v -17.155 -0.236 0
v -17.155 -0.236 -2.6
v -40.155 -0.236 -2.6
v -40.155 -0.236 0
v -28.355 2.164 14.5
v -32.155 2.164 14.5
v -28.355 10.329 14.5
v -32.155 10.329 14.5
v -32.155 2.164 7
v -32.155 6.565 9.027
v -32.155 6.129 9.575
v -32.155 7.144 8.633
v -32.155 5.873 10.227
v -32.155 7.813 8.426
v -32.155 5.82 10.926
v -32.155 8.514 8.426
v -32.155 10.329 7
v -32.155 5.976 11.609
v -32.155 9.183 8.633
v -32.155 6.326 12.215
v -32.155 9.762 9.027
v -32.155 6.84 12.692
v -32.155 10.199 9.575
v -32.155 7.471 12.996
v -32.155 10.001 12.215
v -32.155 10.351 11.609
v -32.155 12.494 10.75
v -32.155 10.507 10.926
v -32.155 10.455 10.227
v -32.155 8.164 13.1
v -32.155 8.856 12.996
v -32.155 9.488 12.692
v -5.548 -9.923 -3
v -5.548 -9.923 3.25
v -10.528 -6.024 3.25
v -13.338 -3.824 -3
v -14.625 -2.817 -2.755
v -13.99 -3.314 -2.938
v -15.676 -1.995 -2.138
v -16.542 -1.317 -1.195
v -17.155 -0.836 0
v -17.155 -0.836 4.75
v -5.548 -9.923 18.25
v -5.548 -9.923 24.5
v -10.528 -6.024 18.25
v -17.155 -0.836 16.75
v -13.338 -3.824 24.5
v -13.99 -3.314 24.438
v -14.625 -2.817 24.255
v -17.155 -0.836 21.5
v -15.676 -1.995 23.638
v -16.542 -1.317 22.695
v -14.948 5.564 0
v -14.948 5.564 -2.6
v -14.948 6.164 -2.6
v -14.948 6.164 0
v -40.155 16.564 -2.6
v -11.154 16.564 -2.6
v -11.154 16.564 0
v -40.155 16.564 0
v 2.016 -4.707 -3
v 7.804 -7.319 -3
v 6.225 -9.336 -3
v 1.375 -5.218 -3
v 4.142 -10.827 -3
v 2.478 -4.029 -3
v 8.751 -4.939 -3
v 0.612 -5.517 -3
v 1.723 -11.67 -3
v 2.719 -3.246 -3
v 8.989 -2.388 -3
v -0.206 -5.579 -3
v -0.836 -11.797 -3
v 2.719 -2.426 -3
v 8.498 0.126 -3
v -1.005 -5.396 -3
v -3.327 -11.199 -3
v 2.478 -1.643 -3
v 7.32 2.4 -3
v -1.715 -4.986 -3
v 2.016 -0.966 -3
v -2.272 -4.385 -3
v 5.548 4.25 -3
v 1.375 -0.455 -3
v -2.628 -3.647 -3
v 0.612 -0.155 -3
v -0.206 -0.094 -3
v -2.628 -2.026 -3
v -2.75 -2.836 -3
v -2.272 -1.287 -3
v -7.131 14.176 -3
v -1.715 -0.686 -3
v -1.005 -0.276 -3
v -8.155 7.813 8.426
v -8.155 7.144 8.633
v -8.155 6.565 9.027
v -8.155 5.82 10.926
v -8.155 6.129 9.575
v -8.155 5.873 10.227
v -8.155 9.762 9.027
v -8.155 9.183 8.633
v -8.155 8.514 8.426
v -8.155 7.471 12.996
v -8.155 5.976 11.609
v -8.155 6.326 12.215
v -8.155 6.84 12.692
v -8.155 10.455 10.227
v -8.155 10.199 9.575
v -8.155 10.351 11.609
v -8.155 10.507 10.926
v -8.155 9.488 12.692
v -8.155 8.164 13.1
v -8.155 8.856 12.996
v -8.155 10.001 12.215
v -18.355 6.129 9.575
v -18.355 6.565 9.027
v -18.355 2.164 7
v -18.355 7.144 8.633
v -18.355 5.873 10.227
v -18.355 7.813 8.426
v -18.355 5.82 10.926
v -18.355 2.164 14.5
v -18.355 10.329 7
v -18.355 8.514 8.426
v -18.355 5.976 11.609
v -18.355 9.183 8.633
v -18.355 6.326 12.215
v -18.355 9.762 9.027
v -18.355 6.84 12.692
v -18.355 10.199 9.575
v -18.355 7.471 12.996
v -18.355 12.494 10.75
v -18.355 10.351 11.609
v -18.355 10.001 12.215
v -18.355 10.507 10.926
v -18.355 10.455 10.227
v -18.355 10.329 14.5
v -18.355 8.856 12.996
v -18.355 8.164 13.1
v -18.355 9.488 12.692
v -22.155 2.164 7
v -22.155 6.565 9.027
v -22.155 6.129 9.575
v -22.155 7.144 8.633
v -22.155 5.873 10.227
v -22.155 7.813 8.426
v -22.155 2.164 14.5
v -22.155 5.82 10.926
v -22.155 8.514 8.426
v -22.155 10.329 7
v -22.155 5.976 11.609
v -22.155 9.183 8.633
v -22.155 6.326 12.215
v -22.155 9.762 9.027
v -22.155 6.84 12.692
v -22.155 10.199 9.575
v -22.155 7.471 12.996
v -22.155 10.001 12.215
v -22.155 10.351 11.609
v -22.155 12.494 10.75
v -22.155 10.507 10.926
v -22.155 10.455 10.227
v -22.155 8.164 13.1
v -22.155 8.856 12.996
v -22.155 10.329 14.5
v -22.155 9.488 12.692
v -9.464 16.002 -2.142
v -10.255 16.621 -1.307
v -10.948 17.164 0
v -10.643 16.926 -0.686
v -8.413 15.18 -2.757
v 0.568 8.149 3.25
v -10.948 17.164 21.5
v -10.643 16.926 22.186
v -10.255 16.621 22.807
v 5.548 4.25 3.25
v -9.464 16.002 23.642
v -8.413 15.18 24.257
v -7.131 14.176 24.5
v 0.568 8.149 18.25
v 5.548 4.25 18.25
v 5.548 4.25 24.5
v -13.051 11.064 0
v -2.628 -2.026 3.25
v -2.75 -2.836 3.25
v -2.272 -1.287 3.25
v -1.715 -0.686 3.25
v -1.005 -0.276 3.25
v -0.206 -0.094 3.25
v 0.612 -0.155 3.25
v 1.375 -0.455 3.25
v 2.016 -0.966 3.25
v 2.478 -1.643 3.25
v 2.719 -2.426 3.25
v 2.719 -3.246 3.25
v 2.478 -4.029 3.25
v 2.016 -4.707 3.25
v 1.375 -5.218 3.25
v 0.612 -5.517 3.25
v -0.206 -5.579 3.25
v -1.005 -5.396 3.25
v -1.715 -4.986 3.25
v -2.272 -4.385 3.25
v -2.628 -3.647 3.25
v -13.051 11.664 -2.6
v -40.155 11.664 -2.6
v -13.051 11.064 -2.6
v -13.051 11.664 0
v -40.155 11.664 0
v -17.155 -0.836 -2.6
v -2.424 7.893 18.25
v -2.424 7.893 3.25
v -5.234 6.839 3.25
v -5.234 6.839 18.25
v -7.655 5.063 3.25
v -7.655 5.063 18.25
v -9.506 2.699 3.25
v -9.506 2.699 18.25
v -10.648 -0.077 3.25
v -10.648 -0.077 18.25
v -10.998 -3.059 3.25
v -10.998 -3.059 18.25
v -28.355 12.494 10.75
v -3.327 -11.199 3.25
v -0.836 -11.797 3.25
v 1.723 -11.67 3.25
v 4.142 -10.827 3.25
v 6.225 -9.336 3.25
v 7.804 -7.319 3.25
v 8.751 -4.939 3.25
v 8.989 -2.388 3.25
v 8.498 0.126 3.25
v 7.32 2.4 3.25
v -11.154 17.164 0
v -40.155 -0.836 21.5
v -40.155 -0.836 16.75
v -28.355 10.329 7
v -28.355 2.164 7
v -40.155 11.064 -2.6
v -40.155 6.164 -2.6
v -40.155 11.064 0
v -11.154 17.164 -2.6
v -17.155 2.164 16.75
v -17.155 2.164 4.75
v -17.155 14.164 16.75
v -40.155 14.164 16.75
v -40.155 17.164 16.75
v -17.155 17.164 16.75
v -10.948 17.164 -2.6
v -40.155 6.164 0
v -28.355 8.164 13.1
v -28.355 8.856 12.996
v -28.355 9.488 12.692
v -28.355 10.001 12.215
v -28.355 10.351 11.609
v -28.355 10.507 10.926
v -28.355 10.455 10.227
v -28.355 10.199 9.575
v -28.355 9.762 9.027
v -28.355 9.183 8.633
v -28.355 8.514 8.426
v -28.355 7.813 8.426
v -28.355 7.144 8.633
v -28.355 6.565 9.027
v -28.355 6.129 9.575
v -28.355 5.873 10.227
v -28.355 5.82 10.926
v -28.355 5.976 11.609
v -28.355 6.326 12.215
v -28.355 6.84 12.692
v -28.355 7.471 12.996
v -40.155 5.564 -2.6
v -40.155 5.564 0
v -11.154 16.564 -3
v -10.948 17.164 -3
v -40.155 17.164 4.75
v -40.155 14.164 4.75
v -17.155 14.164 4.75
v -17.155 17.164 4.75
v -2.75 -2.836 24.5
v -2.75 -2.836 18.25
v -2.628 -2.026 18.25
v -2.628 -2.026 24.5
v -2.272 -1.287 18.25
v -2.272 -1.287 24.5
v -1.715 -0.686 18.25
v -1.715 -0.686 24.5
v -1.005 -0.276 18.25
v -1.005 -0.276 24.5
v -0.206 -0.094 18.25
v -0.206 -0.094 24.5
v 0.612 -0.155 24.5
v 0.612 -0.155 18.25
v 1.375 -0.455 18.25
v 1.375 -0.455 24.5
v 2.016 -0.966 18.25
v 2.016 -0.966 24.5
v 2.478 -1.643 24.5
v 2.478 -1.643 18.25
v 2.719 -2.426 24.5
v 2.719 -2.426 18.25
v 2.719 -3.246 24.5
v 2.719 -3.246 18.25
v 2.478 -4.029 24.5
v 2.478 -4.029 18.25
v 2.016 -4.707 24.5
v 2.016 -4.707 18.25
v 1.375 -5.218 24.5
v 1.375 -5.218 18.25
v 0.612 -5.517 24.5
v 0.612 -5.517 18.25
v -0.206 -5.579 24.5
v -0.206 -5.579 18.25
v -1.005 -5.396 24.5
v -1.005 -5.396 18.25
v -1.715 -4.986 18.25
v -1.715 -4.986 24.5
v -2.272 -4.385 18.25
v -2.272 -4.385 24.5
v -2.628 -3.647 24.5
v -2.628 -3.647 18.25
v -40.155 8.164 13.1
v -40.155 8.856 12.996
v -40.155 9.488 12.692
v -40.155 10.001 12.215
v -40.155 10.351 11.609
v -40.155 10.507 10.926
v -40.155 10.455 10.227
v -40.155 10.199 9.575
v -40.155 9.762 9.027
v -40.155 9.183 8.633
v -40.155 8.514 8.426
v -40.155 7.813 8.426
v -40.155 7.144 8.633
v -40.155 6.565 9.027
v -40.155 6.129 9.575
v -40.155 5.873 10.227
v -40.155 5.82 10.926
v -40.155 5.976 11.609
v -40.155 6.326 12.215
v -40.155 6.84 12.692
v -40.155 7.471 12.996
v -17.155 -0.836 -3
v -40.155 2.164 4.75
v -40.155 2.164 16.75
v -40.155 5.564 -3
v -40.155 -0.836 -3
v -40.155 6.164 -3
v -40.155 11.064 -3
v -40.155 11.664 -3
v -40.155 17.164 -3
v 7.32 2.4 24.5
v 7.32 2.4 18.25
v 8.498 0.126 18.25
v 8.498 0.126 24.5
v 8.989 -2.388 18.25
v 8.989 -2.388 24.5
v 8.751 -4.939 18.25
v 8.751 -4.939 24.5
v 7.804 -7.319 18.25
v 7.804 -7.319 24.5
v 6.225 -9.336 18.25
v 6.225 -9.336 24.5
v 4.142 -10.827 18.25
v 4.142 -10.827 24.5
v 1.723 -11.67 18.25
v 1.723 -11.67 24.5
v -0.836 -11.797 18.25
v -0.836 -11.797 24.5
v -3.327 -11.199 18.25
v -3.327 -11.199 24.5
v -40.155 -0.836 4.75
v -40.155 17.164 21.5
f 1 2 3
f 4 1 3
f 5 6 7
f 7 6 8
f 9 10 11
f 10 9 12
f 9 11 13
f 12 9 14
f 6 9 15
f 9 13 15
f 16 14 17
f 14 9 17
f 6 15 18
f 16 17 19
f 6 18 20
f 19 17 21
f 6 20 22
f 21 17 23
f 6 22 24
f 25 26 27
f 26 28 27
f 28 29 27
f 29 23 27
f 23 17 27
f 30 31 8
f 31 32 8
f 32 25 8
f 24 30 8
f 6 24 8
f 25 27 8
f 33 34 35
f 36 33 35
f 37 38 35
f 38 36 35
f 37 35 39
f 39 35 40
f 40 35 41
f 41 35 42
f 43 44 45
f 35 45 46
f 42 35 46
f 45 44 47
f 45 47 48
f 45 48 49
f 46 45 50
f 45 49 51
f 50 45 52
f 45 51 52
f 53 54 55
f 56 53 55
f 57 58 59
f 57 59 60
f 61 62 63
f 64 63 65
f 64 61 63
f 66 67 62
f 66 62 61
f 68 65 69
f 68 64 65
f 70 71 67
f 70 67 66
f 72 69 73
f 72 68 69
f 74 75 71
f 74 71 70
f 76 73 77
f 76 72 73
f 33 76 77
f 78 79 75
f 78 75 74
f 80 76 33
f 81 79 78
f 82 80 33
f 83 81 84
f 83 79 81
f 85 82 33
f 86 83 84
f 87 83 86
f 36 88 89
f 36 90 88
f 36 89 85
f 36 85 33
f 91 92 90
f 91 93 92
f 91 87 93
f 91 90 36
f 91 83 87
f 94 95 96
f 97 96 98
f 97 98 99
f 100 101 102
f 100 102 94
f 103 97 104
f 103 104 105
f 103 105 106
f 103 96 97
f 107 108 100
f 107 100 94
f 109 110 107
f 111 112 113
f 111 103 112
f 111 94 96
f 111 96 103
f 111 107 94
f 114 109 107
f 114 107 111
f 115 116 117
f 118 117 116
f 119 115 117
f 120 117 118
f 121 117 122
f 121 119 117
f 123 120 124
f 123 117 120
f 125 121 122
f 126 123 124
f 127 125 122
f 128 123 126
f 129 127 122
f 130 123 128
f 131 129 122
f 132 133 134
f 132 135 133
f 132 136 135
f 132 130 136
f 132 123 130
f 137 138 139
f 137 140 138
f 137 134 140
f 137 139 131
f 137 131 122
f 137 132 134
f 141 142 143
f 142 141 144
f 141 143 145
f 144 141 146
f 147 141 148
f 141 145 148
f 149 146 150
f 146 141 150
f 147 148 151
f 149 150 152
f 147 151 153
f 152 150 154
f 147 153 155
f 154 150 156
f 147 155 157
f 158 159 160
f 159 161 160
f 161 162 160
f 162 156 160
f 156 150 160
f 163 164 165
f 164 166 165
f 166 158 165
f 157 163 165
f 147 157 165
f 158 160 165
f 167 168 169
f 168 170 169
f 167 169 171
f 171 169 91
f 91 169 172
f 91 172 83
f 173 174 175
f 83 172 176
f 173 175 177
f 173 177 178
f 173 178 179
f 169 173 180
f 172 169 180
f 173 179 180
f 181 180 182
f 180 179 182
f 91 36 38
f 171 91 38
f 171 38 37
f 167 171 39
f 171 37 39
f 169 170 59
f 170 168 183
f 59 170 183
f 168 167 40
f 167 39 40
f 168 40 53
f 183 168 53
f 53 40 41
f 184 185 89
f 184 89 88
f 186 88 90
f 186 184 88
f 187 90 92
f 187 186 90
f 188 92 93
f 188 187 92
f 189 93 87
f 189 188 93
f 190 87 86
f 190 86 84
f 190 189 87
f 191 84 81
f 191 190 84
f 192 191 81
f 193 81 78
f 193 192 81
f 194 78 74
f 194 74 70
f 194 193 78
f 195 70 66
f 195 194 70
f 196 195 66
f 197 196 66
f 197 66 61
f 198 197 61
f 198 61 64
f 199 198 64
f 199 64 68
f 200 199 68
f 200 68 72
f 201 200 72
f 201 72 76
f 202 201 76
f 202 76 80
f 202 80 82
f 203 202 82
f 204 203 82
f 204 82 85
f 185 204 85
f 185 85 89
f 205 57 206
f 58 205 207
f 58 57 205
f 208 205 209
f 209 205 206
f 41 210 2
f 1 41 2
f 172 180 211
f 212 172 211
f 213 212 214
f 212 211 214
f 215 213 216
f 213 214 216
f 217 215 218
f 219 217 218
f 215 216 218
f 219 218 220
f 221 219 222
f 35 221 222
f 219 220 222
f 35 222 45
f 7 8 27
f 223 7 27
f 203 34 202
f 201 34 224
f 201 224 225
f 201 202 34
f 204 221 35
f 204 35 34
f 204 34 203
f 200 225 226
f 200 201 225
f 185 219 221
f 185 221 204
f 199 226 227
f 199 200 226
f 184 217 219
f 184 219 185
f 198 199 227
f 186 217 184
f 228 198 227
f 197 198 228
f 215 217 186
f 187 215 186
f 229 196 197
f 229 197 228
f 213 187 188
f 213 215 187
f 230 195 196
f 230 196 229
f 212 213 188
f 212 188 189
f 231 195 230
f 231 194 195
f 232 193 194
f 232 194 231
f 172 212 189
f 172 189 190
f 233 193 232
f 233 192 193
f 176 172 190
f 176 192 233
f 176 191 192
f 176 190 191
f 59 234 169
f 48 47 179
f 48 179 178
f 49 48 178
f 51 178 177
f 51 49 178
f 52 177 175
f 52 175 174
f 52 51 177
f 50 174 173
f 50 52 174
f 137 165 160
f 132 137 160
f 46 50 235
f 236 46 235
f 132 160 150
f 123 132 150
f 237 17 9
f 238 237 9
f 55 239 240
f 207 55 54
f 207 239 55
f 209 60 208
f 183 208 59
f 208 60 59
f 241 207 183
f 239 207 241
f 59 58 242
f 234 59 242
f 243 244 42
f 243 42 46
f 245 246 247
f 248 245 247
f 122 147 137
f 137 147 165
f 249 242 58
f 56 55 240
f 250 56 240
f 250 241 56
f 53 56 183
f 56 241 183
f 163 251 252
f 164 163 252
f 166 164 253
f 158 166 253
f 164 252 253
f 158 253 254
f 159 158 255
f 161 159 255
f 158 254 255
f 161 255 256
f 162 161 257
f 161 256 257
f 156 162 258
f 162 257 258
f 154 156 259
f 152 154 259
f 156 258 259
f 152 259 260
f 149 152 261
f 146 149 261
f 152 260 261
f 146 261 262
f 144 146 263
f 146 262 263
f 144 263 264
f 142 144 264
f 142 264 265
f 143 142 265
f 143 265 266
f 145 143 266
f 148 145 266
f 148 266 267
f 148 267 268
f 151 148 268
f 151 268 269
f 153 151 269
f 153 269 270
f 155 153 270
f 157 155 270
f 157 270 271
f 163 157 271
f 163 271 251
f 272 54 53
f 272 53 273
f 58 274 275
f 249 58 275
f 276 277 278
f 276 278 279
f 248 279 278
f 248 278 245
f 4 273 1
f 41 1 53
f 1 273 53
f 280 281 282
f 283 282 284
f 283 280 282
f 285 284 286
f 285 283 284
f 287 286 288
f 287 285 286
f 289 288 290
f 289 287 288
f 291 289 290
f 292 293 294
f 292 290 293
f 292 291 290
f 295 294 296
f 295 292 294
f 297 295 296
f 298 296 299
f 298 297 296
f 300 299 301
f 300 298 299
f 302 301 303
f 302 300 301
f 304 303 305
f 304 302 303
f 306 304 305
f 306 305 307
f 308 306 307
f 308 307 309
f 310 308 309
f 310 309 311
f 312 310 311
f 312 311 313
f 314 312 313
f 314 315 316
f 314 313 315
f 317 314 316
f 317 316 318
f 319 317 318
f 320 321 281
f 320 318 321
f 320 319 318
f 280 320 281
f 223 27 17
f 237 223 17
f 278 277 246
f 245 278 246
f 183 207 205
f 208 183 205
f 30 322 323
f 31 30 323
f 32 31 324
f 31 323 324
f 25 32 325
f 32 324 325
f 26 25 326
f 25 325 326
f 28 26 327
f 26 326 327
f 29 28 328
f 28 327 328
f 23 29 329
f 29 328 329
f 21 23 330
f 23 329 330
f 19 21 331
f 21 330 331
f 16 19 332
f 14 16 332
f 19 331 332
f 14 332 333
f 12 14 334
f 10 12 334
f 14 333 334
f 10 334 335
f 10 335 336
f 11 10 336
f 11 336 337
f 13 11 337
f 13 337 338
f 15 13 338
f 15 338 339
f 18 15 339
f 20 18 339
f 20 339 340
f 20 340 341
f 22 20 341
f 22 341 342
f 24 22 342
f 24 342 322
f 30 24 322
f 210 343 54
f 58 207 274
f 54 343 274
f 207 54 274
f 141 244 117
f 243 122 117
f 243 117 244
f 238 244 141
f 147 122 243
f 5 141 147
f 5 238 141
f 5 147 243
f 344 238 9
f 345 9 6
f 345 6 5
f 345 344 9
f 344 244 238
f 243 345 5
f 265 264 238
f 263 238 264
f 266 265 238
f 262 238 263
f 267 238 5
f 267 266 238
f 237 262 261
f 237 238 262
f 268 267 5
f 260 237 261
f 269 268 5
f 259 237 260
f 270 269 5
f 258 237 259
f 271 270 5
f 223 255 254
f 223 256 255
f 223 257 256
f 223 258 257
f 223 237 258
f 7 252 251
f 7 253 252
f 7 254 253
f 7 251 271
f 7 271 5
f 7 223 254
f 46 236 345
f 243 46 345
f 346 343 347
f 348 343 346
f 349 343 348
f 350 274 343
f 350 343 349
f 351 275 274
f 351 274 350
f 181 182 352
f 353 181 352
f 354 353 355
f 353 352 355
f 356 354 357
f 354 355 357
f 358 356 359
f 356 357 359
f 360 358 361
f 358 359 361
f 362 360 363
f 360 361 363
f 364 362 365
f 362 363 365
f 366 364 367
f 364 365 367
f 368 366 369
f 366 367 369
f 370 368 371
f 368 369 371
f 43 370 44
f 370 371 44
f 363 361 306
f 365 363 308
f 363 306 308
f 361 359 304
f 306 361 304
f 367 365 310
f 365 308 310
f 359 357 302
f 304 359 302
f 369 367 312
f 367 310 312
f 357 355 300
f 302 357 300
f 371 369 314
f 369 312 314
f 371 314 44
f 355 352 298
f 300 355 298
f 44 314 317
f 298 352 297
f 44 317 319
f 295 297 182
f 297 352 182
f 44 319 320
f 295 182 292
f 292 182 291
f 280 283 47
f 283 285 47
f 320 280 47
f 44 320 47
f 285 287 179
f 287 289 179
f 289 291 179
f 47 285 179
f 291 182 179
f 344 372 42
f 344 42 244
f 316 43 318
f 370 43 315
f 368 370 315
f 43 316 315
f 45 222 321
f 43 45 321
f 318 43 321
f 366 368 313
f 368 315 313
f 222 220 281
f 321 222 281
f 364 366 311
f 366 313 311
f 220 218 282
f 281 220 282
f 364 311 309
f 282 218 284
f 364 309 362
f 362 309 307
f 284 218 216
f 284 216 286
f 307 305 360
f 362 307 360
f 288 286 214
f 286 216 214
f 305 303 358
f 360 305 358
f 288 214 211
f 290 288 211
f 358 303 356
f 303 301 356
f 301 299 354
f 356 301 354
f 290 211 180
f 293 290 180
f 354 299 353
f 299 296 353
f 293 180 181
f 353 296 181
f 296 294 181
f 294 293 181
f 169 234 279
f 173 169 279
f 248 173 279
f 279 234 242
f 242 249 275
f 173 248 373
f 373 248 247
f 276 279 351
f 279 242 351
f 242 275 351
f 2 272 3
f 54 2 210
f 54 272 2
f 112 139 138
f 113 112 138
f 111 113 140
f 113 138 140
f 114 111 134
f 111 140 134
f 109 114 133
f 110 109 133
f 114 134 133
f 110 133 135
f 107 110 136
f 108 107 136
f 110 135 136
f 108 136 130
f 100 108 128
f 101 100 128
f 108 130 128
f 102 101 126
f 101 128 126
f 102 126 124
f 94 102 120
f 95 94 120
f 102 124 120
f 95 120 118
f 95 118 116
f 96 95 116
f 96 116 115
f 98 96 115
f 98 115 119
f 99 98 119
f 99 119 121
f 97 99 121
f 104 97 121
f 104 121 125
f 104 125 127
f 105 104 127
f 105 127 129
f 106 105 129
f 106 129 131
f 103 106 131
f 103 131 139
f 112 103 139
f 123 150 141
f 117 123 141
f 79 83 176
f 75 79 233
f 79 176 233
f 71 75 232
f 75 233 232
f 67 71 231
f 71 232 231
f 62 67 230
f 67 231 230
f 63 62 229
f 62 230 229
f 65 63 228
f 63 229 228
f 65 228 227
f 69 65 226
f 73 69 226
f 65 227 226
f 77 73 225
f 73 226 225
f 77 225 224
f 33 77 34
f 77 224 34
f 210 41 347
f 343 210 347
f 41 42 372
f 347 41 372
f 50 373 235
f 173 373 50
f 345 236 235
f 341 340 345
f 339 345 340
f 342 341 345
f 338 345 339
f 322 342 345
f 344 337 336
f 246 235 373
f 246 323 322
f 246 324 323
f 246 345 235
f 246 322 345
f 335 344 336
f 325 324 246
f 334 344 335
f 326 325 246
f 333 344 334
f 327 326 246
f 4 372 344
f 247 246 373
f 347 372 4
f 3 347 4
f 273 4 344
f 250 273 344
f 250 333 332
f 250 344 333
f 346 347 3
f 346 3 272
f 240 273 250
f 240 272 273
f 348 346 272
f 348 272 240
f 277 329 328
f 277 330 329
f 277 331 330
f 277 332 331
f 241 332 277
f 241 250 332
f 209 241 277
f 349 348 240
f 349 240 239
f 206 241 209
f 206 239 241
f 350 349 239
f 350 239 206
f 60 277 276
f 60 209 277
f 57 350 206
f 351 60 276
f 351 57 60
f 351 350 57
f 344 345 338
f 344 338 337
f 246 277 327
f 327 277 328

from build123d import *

# Parameters (mm, degrees)
BOSS_EXTRUDE1_DEPTH  = 5
BOSS_EXTRUDE7_DEPTH  = 5.75
BOSS_EXTRUDE8_START  = -3
BOSS_EXTRUDE8_DEPTH  = 3
SKETCH15_R           = 2.75
CUT_EXTRUDE7_DEPTH   = 46.783095044
FILLET2_R            = 5
SKETCH16_W           = 12
SKETCH16_H           = 3
CUT_EXTRUDE8_DEPTH   = 23
SKETCH17_R           = 2.35
CUT_EXTRUDE9_DEPTH   = 32
CUT_EXTRUDE11_START  = -8
CUT_EXTRUDE11_DEPTH  = 3.8
LPATTERN1_COUNT      = 2
LPATTERN1_PITCH      = 10
SKETCH26_R           = 11
CUT_EXTRUDE12_DEPTH  = 7.5
SKETCH28_W           = 29.000715486
SKETCH28_H           = 0.6
SKETCH28_W_2         = 23
SKETCH28_W_3         = 27.103937603
SKETCH28_W_4         = 25.207159719
BOSS_EXTRUDE9_DEPTH  = 3
BOSS_EXTRUDE10_DEPTH = 0.4


with BuildPart() as part:
    # Sketch1 → Boss-Extrude1 (new body)
    with BuildSketch(Plane.XY):
        with BuildLine():
            Line((-40.155138696, -0.836255417), (-17.155138696, -0.836255417))
            Line((-17.155138696, -0.836255417), (-5.547811002, -9.922989015))
            ThreePointArc((-5.547811002, -9.922989015), (7.086733598, -8.384066419), (5.547811002, 4.250478181))
            Line((5.547811002, 4.250478181), (-10.947501986, 17.163744583))
            Line((-10.947501986, 17.163744583), (-40.155138696, 17.163744583))
            Line((-40.155138696, 17.163744583), (-40.155138696, -0.836255417))
        make_face()
    extrude(amount=BOSS_EXTRUDE1_DEPTH)

    # Sketch14 → Boss-Extrude7 (add)
    with BuildSketch(Plane.XY.offset(5)):
        with BuildLine():
            Line((-40.155138696, -0.836255417), (-40.155138696, 17.163744583))
            Line((-40.155138696, 17.163744583), (-10.947501986, 17.163744583))
            Line((-10.947501986, 17.163744583), (5.547811002, 4.250478181))
            ThreePointArc((5.547811002, 4.250478181), (7.086733598, -8.384066419), (-5.547811002, -9.922989015))
            Line((-5.547811002, -9.922989015), (-17.155138696, -0.836255417))
            Line((-17.155138696, -0.836255417), (-40.155138696, -0.836255417))
        make_face()
    extrude(amount=BOSS_EXTRUDE7_DEPTH)

    # Sketch27 → Boss-Extrude8 (add)
    with BuildSketch(Plane.XY.offset(BOSS_EXTRUDE8_START)):
        with BuildLine():
            Line((-17.155138696, -0.836255417), (-10.947501986, 17.163744583))
            Line((-10.947501986, 17.163744583), (5.547811002, 4.250478181))
            ThreePointArc((5.547811002, 4.250478181), (7.086733598, -8.384066419), (-5.547811002, -9.922989015))
            Line((-5.547811002, -9.922989015), (-17.155138696, -0.836255417))
        make_face()
    extrude(amount=BOSS_EXTRUDE8_DEPTH)

    # Sketch15 → Cut-Extrude7 (cut, through all)
    with BuildSketch(Plane(origin=(0, 0, -3), x_dir=(-1, 0, 0), z_dir=(0, 0, -1))):
        with Locations((0, -2.836255417)):
            Circle(SKETCH15_R)
    extrude(amount=-CUT_EXTRUDE7_DEPTH, mode=Mode.SUBTRACT)

    # Fillet2
    # the kernel refuses this fillet: 5 mm, written as the material it takes off along each edge
    with BuildSketch(Plane(origin=(-20.89022917, -11.666726282, -3), x_dir=(0.9453610009462032, -0.32602542522016986, 0), z_dir=(0.3260254252201699, 0.9453610009462033, 0))) as fillet2_piece_1:
        with BuildLine():
            CenterArc((4.582575695, -5), FILLET2_R, 90, 66.421821522)
            Line((0, -3), (-0.091651514, -2.96))
            ThreePointArc((-0.091651514, -2.96), (-0.1, -1.5), (-0.1, 0))
            Line((-0.1, 0), (0, 0.1))
            Line((0, 0.1), (4.582575695, 0.1))
            Line((4.582575695, 0.1), (4.582575695, 0))
        make_face()
    extrude(amount=41.95322389, mode=Mode.SUBTRACT)

    # Mirror1: part across plane


with BuildPart() as part_1:
    add(part.part)
    add(part.part.mirror(Plane(origin=(0, -2.836255417, 10.75), x_dir=(1, 0, 0), z_dir=(0, 0, 1))))

    # Sketch16 → Cut-Extrude8 (cut)
    with BuildSketch(Plane.ZY.offset(40.155138696)):
        with Locations((10.75, 0.663744583)):
            Rectangle(SKETCH16_W, SKETCH16_H)
        with Locations((10.75, 15.663744583)):
            Rectangle(SKETCH16_W, SKETCH16_H)
    extrude(amount=-CUT_EXTRUDE8_DEPTH, mode=Mode.SUBTRACT)

    # Sketch17 → Cut-Extrude9 (cut)
    with BuildSketch(Plane.ZY.offset(40.155138696)):
        with Locations((10.75, 8.163744583)):
            Circle(SKETCH17_R)
    extrude(amount=-CUT_EXTRUDE9_DEPTH, mode=Mode.SUBTRACT)

    # Sketch20 → Cut-Extrude11 (cut)
    with BuildSketch(Plane.ZY.offset(40.155138696).offset(CUT_EXTRUDE11_START)):
        Polygon((14.5, 2.163744583), (14.5, 5.998681073), (10.75, 3.833617564), (7, 5.998681073), (7, 2.163744583), align=None)
        Polygon((10.75, 3.833617564), (14.5, 5.998681073), (14.5, 10.328808092), (10.75, 12.493871602), (7, 10.328808092), (7, 5.998681073), align=None)
    cut_extrude11 = extrude(amount=-CUT_EXTRUDE11_DEPTH, mode=Mode.SUBTRACT)

    # LPattern1: Cut-Extrude11 ×2
    with Locations(*[(i * LPATTERN1_PITCH, 0, 0) for i in range(1, LPATTERN1_COUNT)]):
        add(cut_extrude11, mode=Mode.SUBTRACT)

    # Sketch26 → Cut-Extrude12 (cut, symmetric)
    with BuildSketch(Plane.XY.offset(10.75)):
        with Locations((0, -2.836255417)):
            Circle(SKETCH26_R)
    extrude(amount=CUT_EXTRUDE12_DEPTH, both=True, mode=Mode.SUBTRACT)

    # Sketch28 → Boss-Extrude9 (add)
    with BuildSketch(Plane(origin=(0, 0, -3), x_dir=(-1, 0, 0), z_dir=(0, 0, -1))):
        with Locations((25.654780953, 16.863744583)):
            Rectangle(SKETCH28_W, SKETCH28_H)
        with Locations((28.655138696, -0.536255417)):
            Rectangle(SKETCH28_W_2, SKETCH28_H)
        with Locations((26.603169895, 11.363744583)):
            Rectangle(SKETCH28_W_3, SKETCH28_H)
        with Locations((27.551558836, 5.863744583)):
            Rectangle(SKETCH28_W_4, SKETCH28_H)
    extrude(amount=-BOSS_EXTRUDE9_DEPTH)

    # Sketch29 → Boss-Extrude10 (add)
    with BuildSketch(Plane(origin=(0, 0, -3), x_dir=(-1, 0, 0), z_dir=(0, 0, -1))):
        Polygon((40.155138696, 17.163744583), (40.155138696, -0.836255417), (17.155138696, -0.836255417), (11.15442321, 16.563744583), (10.947501986, 17.163744583), align=None)
    extrude(amount=-BOSS_EXTRUDE10_DEPTH)


solid = part_1.part
